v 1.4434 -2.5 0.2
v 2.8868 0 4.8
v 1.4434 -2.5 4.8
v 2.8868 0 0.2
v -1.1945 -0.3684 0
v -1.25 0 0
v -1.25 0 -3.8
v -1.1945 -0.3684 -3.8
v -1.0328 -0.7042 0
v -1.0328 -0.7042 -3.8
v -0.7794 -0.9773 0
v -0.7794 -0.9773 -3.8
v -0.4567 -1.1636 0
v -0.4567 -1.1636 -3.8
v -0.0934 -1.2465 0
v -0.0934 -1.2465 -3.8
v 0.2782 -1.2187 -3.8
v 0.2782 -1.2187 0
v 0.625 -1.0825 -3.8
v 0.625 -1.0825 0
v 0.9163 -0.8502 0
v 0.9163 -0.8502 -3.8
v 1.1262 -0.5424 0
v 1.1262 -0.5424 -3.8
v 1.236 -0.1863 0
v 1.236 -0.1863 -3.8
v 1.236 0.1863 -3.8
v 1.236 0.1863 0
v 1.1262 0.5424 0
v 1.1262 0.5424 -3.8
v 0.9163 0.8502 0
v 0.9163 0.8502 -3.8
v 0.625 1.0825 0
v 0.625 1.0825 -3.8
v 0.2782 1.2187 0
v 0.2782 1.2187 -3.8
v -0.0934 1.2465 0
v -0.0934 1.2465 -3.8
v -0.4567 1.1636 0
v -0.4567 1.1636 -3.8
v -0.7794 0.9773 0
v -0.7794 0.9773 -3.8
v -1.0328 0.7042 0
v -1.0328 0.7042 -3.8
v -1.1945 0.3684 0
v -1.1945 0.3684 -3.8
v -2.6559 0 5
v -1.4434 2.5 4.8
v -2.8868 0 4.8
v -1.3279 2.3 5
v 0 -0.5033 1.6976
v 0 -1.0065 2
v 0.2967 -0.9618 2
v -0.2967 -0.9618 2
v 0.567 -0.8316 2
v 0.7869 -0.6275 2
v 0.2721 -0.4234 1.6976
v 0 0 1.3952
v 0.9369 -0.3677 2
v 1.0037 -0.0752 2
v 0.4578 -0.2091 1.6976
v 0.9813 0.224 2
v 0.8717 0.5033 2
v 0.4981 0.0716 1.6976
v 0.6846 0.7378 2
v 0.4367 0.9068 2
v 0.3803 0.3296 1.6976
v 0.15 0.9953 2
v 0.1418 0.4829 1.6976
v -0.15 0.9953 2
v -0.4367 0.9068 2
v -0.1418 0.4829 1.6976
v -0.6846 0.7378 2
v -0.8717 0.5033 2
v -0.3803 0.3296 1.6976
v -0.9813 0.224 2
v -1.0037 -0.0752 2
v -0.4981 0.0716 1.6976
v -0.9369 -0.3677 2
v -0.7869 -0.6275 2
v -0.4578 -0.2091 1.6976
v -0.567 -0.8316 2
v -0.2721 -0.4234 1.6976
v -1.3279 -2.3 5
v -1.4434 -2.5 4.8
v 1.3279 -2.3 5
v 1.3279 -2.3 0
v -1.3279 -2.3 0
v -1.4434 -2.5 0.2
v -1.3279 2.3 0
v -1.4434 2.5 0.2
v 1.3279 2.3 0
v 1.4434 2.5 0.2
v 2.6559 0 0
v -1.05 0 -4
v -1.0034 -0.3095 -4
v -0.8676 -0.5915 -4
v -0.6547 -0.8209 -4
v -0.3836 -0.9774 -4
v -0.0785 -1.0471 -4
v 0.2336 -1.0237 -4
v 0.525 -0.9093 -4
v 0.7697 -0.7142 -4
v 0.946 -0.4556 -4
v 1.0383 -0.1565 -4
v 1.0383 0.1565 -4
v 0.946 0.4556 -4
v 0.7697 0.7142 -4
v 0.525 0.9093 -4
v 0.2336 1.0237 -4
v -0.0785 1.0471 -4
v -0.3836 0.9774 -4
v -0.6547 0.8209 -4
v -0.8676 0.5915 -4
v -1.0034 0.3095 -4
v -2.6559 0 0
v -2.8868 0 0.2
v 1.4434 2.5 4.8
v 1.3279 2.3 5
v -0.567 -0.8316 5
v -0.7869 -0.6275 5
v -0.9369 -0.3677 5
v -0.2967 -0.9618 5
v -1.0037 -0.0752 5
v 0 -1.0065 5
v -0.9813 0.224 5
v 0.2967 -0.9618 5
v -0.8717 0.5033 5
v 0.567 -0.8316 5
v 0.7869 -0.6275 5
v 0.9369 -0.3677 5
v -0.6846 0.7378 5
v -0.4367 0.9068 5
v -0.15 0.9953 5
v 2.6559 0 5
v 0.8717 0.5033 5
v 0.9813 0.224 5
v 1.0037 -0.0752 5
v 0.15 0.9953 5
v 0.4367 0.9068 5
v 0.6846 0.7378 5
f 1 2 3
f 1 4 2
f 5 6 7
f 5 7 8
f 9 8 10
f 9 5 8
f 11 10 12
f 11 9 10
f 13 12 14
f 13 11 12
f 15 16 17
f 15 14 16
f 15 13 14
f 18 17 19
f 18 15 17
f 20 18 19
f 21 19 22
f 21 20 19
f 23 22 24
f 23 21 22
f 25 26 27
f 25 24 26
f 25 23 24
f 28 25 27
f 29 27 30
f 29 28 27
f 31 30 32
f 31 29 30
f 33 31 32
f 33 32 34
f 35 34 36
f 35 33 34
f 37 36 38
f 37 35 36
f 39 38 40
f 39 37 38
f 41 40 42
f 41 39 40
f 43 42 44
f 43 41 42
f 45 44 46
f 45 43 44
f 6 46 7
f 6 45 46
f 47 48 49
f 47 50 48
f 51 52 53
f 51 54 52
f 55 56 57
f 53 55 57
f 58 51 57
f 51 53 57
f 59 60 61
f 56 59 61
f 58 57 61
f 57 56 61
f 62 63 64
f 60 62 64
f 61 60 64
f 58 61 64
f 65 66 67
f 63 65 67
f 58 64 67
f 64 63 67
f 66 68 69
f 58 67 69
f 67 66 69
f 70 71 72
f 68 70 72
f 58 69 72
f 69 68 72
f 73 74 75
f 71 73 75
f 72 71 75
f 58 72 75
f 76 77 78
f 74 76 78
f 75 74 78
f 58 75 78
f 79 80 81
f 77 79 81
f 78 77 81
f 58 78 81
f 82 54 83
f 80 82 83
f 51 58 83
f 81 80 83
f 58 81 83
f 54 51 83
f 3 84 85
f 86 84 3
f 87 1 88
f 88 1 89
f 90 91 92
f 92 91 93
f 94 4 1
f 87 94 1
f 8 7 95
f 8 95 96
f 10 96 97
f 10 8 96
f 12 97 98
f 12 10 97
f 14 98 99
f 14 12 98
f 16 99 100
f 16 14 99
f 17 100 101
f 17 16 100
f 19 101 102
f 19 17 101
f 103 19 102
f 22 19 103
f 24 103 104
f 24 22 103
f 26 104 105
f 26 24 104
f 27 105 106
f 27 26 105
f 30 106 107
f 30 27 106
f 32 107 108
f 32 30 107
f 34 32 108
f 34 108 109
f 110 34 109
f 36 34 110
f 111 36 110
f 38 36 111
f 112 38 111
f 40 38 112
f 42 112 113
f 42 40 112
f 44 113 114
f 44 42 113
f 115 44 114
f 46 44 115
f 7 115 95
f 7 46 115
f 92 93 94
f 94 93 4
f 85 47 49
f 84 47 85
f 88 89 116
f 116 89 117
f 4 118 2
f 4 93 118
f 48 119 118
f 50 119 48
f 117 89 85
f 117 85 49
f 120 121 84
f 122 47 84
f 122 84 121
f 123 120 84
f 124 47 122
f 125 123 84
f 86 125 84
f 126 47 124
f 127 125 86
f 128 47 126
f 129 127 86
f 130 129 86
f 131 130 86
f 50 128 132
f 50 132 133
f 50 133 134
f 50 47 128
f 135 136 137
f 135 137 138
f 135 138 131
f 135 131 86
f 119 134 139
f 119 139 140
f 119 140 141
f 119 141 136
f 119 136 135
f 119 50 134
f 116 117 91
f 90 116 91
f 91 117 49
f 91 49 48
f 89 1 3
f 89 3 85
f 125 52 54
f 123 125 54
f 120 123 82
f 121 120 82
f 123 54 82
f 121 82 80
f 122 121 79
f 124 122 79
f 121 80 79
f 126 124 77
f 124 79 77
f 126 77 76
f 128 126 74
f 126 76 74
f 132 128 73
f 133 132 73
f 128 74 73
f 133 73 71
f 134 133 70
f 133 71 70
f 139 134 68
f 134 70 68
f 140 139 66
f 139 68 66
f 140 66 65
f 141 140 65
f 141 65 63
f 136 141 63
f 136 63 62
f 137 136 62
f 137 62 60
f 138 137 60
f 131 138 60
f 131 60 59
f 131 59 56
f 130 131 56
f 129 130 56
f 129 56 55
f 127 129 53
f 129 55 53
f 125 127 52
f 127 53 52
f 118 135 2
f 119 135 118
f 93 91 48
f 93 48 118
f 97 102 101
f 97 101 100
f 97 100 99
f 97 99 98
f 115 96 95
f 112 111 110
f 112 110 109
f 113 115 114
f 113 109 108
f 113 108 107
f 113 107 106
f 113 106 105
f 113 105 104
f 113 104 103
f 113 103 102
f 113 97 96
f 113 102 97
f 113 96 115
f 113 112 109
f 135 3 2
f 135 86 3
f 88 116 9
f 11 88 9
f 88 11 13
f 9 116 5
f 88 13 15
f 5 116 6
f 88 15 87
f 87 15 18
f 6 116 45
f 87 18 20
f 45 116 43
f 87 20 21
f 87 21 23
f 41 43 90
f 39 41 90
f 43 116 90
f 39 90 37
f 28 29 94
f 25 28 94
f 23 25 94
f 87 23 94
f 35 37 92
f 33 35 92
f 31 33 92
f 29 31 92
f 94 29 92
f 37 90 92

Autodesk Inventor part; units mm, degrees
ref_plane "YZ Plane" through (0, 0, 0) normal (1, 0, 0) x (0, 1, 0)
ref_plane "XZ Plane" through (0, 0, 0) normal (0, 1, 0) x (-1, 0, 0)
ref_plane "XY Plane" through (0, 0, 0) normal (0, 0, 1) x (1, 0, 0)
sketch "Skizze1" plane through (0, 0, 0) normal (0, 0, 1) x (1, 0, 0)
  line L0 (1.4434, 2.5) -> (2.8868, 0)
  line L1 (2.8868, 0) -> (1.4434, -2.5)
  line L2 (1.4434, -2.5) -> (-1.4434, -2.5)
  line L3 (-1.4434, -2.5) -> (-2.8868, 0)
  line L4 (-2.8868, 0) -> (-1.4434, 2.5)
  line L5 (-1.4434, 2.5) -> (1.4434, 2.5)
  point P0 (0, 0)
  point P1 (0, 0)
  dimension "d0" = 5
extrude "Extrusion1" add sketch "Skizze1" along normal blind 5
sketch "Skizze2" plane through (0, 0, 0) normal (0, 0, -1) x (-1, 0, 0)
  circle A0 centre (0, 0) radius 1.25
  dimension "d3" = 2.5
extrude "Extrusion2" add sketch "Skizze2" along normal blind 4
chamfer "Fasen1" distance 0.2 angle 45 1 edges at (1.25, 0, -4)
sketch "Skizze3" plane through (0, 0, 5) normal (0, 0, 1) x (1, 0, 0)
  point P0 (0, 0)
  point P1 (0, 0)
hole "Bohrung1" at (0, 0, 5) direction (0, 0, -1) diameter 2.013 depth 3 tip angle 118 thread size "M2.5x0.45" class "6H" standard "ISO Metric profile"
thread "Gewinde1" size "M2.5x0.45" class "6g" standard "ISO Metric profile" full length
chamfer "Fasen2" distance 0.2 angle 45 12 edges at (2.1651, 1.25, 5) (2.1651, -1.25, 5) (0, -2.5, 5) (-2.1651, -1.25, 5) (-2.1651, 1.25, 5) (0, 2.5, 5) (0, 2.5, 0) (2.1651, 1.25, 0) (2.1651, -1.25, 0) (-2.1651, 1.25, 0) (-2.1651, -1.25, 0) (0, -2.5, 0)
properties part number "Abstandsbolzen_Jetson"
